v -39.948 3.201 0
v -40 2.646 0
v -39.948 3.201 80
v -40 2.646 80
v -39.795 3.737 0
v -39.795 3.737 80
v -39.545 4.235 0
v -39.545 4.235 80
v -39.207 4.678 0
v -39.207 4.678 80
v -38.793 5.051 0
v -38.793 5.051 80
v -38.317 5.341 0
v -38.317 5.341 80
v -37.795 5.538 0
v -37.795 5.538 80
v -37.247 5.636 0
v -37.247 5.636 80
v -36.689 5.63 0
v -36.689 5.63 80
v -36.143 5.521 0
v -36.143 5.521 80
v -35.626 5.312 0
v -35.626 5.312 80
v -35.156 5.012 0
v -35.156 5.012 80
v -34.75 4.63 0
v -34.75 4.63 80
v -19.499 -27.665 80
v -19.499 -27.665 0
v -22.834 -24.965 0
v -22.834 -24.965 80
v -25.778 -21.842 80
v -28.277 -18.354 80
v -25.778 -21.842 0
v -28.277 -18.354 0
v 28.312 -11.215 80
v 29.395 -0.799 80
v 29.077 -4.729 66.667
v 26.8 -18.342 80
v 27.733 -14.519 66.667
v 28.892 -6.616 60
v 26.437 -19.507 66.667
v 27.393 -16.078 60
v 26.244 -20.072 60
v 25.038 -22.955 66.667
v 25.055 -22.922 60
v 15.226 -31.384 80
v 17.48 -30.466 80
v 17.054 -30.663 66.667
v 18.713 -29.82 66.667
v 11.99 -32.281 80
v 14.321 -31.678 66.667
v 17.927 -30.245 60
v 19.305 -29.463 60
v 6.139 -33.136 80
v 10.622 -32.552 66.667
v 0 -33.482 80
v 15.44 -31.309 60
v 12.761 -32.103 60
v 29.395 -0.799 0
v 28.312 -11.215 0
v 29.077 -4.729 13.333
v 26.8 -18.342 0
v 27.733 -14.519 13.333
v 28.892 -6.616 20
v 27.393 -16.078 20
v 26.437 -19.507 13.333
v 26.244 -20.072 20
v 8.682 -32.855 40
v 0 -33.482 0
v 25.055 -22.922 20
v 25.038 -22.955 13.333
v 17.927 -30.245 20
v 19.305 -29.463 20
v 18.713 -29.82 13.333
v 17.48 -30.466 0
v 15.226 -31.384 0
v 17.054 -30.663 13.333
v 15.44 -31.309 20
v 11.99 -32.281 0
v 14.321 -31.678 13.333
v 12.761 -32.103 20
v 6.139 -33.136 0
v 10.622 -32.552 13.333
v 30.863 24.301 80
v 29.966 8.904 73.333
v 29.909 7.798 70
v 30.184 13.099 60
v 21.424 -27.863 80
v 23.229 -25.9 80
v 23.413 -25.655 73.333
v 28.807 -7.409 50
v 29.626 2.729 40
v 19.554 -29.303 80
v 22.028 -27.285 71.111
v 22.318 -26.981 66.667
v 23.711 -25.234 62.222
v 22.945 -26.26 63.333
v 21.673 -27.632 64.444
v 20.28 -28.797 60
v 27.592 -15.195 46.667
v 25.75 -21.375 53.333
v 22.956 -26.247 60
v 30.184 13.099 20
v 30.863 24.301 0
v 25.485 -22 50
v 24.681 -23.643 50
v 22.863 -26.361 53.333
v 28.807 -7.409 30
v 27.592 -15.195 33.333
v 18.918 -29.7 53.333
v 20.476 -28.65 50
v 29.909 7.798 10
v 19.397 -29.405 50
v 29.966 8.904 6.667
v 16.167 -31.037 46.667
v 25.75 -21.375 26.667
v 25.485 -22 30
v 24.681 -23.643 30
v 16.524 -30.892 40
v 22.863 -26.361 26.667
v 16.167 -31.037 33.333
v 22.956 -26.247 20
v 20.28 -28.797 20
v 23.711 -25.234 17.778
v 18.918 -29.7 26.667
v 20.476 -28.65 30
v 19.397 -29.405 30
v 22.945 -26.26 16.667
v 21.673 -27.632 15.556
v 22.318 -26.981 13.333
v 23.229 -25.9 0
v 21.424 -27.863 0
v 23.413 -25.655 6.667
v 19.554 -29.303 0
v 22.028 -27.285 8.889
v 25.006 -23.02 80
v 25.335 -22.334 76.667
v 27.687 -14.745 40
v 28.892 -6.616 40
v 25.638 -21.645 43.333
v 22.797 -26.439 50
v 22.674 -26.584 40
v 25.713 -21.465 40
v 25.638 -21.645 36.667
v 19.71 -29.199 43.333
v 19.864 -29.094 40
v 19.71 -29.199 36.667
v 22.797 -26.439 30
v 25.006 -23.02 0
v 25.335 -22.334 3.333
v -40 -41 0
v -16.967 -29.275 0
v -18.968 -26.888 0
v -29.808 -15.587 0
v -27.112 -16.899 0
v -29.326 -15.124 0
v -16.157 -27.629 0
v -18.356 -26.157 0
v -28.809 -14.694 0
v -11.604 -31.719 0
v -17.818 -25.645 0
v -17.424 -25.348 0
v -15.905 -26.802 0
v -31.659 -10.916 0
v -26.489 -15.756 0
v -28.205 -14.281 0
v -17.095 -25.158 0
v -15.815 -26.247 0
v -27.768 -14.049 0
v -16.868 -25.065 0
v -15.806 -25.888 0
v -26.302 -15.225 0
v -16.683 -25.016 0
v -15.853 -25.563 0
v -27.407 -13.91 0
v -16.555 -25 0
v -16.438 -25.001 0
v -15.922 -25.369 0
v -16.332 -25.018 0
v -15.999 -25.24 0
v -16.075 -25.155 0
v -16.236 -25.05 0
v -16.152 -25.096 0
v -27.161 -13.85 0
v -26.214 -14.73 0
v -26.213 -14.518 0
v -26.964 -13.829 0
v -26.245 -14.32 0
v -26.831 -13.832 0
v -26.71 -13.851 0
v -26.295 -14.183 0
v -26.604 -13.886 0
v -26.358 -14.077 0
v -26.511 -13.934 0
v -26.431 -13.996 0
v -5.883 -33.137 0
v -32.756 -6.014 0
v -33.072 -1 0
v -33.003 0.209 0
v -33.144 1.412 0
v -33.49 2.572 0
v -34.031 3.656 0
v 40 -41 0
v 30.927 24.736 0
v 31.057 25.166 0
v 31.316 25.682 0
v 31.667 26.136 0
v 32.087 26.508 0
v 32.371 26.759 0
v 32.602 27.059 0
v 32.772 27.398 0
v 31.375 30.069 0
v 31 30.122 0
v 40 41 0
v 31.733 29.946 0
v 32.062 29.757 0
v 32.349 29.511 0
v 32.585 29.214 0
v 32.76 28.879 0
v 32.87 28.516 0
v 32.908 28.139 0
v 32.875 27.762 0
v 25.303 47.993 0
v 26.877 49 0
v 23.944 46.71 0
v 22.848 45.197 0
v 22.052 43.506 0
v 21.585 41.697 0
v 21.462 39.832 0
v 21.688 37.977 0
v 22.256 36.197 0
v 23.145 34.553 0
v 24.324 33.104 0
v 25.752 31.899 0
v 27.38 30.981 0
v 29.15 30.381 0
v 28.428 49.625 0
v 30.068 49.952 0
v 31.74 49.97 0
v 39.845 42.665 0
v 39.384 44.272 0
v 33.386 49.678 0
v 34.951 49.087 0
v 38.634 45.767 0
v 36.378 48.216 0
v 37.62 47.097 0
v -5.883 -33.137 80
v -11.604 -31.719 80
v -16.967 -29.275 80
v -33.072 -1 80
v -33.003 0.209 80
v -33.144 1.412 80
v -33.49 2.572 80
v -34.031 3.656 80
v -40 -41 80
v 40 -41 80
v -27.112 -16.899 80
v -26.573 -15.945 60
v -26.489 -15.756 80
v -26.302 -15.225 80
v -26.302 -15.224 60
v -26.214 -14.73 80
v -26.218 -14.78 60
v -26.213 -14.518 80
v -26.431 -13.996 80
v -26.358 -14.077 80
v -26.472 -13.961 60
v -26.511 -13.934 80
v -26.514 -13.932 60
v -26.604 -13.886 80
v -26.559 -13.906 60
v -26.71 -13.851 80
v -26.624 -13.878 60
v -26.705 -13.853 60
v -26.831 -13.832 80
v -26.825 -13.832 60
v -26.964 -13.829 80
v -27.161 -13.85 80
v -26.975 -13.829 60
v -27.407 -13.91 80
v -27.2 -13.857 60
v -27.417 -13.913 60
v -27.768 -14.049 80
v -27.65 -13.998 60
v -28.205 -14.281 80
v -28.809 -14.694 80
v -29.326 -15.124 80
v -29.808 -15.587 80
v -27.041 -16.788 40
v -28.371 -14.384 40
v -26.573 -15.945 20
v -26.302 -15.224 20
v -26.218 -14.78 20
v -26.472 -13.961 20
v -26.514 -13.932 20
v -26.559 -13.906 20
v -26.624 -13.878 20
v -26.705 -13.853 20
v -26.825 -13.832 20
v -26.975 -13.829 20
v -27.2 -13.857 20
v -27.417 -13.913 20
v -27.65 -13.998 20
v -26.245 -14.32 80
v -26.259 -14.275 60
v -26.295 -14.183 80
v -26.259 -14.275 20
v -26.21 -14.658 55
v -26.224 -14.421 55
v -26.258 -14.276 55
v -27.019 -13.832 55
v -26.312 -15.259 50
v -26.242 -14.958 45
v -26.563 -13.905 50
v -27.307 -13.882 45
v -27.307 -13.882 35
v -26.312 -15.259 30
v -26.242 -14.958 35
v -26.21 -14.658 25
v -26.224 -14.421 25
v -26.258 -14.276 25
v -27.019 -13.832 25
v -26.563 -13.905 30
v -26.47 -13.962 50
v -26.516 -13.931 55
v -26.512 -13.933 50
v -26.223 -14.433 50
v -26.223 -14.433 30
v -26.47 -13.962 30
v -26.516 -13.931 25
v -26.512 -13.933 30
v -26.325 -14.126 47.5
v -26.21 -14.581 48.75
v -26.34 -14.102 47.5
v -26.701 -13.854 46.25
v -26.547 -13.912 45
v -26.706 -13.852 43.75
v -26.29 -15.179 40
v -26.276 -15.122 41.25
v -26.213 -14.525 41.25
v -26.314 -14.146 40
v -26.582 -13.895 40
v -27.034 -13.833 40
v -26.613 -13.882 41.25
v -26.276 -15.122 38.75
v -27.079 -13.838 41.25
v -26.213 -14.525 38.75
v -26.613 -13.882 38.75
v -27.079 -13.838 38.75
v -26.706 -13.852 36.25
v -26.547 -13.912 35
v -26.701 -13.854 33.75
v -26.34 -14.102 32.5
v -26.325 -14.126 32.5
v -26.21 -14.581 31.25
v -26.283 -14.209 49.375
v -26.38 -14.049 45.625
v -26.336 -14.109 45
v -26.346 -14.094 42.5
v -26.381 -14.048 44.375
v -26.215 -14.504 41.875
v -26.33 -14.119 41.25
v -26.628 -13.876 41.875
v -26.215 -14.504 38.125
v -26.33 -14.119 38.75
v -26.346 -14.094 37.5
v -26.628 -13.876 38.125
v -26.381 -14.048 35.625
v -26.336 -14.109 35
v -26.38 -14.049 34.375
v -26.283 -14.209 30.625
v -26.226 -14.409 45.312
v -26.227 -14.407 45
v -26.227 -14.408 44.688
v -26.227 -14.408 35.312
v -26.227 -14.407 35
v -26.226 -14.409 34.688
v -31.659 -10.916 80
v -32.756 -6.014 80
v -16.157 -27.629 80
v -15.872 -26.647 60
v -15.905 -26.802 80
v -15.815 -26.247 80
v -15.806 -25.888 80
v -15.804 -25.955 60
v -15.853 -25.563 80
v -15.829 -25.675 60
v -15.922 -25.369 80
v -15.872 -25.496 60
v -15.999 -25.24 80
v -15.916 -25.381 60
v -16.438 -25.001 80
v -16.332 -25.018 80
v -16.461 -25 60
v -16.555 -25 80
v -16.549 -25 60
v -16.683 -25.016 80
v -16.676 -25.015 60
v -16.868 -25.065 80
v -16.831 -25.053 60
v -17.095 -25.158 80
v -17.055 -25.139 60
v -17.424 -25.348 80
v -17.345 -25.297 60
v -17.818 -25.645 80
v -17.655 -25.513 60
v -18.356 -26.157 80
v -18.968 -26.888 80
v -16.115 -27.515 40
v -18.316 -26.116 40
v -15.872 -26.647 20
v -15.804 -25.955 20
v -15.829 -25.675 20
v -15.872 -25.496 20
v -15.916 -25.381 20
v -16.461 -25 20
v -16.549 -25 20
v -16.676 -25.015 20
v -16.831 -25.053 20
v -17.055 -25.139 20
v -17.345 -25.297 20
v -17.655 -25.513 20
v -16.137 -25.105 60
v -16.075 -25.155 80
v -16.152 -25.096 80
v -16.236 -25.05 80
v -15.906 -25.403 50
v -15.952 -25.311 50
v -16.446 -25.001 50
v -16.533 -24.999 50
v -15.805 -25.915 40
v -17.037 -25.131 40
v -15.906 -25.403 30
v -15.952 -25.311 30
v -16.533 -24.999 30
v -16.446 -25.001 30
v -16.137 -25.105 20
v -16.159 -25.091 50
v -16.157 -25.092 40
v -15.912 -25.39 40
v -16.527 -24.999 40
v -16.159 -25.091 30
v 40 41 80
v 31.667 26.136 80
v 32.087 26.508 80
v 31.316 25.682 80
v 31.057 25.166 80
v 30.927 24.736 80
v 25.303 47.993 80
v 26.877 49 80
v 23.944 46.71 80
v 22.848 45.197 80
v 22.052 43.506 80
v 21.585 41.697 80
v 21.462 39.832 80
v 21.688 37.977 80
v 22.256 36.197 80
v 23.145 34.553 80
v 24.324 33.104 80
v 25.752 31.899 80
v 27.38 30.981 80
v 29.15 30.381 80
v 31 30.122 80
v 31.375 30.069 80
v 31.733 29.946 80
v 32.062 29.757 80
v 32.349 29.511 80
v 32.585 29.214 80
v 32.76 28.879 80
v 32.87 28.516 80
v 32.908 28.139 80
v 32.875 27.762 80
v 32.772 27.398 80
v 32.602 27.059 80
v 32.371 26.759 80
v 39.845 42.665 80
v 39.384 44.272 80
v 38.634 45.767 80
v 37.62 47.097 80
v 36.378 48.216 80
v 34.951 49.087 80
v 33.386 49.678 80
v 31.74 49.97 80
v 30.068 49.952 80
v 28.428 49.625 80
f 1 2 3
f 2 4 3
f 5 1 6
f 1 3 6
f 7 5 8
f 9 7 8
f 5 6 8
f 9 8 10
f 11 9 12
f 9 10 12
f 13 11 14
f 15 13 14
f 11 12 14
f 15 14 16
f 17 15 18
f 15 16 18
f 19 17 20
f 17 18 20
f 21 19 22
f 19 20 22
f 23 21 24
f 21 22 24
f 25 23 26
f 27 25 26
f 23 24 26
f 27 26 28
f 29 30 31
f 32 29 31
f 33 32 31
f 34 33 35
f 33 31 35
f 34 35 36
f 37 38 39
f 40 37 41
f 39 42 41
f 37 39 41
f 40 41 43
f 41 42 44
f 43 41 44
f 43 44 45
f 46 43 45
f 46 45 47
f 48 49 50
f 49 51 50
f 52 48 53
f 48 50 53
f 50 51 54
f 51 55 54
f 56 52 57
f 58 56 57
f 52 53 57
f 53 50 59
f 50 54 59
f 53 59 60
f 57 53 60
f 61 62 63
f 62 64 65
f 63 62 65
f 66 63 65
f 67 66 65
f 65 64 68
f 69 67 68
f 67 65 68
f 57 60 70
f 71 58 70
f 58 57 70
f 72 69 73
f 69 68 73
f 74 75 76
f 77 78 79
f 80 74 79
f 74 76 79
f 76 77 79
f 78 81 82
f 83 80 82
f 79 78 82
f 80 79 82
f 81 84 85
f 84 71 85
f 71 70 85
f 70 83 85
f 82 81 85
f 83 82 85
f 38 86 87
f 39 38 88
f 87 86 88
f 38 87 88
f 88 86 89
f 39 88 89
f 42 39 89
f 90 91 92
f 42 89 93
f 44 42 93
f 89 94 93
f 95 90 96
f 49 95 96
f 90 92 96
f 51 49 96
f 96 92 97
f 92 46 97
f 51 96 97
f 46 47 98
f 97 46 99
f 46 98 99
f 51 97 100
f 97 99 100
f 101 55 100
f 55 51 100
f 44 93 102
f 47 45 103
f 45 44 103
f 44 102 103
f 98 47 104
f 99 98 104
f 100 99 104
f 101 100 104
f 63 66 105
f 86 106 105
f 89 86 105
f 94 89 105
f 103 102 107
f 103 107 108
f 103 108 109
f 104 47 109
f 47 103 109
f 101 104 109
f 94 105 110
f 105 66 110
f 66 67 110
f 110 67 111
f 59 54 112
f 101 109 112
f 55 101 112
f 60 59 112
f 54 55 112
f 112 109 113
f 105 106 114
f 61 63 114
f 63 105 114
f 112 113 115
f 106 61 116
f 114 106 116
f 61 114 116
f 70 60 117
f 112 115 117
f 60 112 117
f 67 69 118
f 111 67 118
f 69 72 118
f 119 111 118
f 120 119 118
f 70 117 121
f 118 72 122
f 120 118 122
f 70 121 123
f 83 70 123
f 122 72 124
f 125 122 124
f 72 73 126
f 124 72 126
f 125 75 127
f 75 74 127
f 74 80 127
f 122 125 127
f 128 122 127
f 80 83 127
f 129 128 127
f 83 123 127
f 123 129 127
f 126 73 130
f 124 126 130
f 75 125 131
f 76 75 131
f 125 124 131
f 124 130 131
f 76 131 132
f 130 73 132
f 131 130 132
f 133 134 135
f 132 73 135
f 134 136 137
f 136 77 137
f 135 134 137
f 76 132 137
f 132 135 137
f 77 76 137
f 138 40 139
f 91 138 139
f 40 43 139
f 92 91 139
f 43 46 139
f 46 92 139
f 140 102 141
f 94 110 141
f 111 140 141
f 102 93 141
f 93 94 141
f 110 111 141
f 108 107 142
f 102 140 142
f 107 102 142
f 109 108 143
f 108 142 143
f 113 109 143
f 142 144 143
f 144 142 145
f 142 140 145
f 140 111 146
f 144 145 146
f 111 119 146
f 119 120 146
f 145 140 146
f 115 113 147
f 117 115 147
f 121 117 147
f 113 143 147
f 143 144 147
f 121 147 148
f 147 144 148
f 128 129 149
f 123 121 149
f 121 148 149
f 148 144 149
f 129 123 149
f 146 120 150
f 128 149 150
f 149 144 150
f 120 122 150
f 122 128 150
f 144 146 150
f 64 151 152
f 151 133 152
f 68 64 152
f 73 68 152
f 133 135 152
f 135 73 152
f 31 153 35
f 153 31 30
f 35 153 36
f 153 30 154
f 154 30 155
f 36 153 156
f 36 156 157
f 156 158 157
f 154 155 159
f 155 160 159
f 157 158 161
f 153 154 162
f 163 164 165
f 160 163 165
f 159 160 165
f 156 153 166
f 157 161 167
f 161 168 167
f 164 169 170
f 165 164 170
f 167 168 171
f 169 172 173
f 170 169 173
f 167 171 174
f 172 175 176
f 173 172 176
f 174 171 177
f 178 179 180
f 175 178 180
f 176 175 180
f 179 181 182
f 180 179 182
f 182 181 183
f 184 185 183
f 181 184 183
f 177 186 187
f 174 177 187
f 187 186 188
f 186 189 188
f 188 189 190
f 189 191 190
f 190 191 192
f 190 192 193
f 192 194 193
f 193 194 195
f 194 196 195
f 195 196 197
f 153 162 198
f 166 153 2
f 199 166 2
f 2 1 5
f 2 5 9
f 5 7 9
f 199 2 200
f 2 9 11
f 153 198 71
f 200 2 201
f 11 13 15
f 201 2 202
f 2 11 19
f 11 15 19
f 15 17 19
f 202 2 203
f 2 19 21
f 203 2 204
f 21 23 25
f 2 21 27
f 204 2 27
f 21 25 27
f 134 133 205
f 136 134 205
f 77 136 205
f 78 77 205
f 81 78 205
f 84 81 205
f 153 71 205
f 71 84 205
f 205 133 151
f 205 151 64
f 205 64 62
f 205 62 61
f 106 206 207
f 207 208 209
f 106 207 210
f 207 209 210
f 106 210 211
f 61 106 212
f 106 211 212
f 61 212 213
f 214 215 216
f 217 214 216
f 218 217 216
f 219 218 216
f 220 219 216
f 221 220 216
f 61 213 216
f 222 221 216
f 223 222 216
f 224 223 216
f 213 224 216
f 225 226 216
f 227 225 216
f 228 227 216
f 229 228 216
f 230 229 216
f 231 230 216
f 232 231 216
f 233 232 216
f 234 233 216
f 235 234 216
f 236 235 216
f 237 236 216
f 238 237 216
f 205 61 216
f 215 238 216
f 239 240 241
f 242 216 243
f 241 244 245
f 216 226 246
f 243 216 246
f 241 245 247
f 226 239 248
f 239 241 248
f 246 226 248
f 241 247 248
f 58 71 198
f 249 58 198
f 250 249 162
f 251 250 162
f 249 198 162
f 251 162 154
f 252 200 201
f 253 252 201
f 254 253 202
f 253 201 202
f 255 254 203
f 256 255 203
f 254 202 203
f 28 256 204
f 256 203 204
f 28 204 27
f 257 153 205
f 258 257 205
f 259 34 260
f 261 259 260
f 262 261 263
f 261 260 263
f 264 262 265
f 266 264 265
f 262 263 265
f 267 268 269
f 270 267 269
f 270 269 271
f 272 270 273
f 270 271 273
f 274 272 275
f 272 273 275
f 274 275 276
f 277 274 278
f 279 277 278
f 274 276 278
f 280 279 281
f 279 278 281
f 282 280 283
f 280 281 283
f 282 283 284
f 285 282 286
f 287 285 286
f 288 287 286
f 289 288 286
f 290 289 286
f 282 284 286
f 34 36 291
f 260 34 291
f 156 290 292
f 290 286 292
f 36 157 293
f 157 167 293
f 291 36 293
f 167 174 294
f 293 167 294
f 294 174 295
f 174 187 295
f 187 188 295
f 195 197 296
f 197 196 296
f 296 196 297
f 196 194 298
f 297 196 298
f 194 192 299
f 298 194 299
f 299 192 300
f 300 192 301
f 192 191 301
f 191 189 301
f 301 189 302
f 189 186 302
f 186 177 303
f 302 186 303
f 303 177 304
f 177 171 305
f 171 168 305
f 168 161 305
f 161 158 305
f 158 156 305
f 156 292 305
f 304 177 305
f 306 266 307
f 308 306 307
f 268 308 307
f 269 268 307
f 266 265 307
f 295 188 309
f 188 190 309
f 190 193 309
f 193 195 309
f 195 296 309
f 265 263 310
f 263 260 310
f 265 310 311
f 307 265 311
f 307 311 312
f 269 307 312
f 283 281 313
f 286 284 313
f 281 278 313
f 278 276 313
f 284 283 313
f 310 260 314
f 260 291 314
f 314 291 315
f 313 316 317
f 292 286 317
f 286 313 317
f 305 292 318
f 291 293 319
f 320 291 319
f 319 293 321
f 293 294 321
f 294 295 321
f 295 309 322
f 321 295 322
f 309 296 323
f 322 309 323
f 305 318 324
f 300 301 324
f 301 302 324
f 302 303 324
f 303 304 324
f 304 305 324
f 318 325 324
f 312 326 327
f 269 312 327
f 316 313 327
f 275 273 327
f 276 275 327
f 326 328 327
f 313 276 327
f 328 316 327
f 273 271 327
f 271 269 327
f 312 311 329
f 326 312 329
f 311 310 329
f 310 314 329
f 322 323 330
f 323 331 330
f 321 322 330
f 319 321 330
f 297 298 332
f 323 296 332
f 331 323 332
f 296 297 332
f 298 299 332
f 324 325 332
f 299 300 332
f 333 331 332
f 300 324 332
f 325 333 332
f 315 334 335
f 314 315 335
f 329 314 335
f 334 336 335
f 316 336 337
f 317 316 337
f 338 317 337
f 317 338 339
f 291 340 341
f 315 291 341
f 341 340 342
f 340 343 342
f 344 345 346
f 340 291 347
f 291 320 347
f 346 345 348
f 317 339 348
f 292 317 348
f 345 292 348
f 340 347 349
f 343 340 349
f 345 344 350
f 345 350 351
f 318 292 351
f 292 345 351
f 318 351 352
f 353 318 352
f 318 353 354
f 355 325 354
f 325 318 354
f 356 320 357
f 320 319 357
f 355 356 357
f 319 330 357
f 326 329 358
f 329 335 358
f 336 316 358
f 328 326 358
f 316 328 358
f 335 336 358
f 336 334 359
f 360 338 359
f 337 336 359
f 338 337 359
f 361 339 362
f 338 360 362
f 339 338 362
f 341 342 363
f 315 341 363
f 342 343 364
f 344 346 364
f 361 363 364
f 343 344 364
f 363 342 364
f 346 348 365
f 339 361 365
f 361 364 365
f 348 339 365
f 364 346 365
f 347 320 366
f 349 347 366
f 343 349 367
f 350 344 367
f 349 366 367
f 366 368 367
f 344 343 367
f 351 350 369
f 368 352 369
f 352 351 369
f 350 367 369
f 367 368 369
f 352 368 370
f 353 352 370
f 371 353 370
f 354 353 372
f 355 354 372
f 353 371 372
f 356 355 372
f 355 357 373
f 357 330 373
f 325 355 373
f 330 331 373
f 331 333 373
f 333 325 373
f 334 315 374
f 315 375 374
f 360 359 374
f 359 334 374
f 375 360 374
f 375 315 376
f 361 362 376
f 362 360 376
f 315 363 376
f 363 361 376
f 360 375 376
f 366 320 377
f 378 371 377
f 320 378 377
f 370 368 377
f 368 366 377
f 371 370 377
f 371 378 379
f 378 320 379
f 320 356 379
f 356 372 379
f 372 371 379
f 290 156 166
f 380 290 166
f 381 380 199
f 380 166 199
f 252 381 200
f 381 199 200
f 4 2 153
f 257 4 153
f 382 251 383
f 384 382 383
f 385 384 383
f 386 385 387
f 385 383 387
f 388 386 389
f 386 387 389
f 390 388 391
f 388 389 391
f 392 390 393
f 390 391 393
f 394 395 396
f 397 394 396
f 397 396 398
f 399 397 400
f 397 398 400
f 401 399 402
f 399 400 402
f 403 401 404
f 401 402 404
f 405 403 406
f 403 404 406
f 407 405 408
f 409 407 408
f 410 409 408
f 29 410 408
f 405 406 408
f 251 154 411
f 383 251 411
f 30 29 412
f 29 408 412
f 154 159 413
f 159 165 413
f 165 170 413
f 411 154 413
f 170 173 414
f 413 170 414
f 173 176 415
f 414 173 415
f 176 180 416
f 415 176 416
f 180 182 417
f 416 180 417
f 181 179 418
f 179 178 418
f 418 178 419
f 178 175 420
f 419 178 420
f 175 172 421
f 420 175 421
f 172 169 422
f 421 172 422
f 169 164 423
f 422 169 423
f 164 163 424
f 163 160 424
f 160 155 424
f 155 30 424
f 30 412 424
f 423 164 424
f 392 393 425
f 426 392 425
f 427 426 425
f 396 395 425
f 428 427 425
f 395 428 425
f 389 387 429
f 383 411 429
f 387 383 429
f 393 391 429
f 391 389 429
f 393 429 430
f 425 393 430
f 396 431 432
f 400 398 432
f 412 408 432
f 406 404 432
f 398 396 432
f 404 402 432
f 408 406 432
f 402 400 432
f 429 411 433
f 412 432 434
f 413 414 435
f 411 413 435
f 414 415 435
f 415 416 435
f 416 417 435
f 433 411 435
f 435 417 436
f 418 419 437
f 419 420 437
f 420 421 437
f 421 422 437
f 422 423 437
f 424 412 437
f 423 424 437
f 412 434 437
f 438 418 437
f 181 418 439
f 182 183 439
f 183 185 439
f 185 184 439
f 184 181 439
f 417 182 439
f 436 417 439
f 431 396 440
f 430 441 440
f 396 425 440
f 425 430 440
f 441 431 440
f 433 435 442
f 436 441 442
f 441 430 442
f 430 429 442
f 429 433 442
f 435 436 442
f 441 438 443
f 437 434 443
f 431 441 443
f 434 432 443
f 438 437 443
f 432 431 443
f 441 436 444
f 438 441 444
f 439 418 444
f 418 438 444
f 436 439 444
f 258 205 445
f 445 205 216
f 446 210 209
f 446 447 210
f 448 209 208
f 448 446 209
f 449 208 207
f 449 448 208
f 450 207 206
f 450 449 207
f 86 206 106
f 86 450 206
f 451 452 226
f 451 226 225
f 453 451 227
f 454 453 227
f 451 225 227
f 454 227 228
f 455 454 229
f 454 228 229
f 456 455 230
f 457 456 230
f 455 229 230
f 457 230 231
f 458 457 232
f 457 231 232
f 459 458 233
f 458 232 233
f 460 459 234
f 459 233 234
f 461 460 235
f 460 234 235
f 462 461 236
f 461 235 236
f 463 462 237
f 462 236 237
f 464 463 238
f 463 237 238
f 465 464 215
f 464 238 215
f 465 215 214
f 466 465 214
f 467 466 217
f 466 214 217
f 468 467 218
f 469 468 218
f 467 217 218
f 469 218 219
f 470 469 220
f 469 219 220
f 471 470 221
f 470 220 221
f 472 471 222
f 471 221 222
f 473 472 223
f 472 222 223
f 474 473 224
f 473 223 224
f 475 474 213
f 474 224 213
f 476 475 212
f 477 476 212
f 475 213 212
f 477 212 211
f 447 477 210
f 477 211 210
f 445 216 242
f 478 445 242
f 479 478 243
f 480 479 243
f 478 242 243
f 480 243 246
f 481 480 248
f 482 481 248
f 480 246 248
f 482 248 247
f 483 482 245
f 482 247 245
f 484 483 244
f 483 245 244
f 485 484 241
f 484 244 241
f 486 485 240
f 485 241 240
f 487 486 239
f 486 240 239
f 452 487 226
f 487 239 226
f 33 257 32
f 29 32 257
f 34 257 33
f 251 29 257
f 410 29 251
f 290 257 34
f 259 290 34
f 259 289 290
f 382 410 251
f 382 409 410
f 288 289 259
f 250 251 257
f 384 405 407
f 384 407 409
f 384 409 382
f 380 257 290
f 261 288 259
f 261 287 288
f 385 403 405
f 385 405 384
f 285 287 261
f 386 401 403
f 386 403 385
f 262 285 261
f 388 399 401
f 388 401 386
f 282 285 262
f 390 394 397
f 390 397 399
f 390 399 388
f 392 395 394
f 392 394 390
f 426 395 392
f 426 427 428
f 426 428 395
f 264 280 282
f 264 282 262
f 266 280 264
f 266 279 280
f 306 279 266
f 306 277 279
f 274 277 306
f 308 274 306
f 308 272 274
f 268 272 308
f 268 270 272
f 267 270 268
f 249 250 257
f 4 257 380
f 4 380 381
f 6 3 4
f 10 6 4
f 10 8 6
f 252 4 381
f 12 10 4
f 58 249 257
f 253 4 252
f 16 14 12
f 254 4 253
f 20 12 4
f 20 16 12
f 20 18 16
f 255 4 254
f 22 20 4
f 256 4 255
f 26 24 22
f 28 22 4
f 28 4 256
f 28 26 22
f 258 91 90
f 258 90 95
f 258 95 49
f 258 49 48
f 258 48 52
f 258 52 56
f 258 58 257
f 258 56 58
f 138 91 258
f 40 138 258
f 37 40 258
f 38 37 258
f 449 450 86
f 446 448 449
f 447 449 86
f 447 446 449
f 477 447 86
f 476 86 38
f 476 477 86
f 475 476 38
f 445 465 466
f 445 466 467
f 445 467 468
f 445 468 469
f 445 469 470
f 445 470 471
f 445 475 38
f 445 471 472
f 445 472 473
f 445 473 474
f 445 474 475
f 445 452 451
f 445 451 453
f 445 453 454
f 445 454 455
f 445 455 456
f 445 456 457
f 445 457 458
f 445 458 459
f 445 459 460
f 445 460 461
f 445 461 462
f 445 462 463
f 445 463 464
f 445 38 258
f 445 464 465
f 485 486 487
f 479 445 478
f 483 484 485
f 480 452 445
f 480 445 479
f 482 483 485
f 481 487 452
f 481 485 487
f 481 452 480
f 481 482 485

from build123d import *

# Parameters (mm, degrees)
F1_DEPTH = 80
F2_R     = 3
F3_R     = 3


with BuildPart() as f1:
    # F0 (on Top) → F1 (new body)
    with BuildSketch(Plane.XY):
        with BuildLine():
            Line((-40, 7), (-40, -41))
            Line((-40, -41), (40, -41))
            Line((40, -41), (40, 41))
            ThreePointArc((40, 41), (35.6846584384, 48.6846584384), (26.8768943744, 49))
            ThreePointArc((26.8768943744, 49), (21.6884164325, 37.9773734121), (31, 30.1216104501))
            ThreePointArc((31, 30.1216104501), (32.9083754305, 28.1237103179), (31, 26.1258101857))
            add(Edge.make_bspline(
                [(31, 26.1258101857), (29.1383194506, 2.2108836058), (30.9167526541, -31.2253562681), (8.8170867264, -33.1853542307), (0, -33.4819146159)],
                knots=[0, 0, 0, 0, 0.6000833432, 1, 1, 1, 1], degree=3))
            ThreePointArc((0, -33.4819146159), (-8.7763698001, -32.5596158188), (-16.9671031431, -29.2752301466))
            add(Edge.make_bspline(
                [(-16.9671031431, -29.2752301466), (-14.901822055, -25.8906310448), (-16.1565216247, -25.0924466589), (-17.4112211944, -24.2942622731), (-19.4985771018, -27.664818351)],
                knots=[4.7144665779, 4.7144665779, 4.7144665779, 6.2764659366, 6.2764659366, 7.8384652954, 7.8384652954, 7.8384652954], degree=2, weights=[1, 0.710210129, 1, 0.710210129, 1]))
            ThreePointArc((-19.4985771018, -27.664818351), (-24.3581566231, -23.452844128), (-28.2774287922, -18.3542614188))
            add(Edge.make_bspline(
                [(-28.2774287922, -18.3542614188), (-25.5565793832, -15.5150943204), (-26.3141793997, -14.1455346477), (-27.0717794162, -12.7759749751), (-29.8082391869, -15.5869222722)],
                knots=[1.4456697136, 1.4456697136, 1.4456697136, 3.0061633493, 3.0061633493, 4.566656985, 4.566656985, 4.566656985], degree=2, weights=[1, 0.7107399344, 1, 0.7107399344, 1]))
            ThreePointArc((-29.8082391869, -15.5869222722), (-32.3036744342, -8.4866885025), (-33.0717967697, -1))
            ThreePointArc((-33.0717967697, -1), (-34.7084973779, 4.582575695), (-40, 7))
        make_face()
    extrude(amount=F1_DEPTH)

    # F2
    f2_edges = [f1.edges().sort_by_distance(p)[0] for p in [
        (-40, 7, 40),
    ]]
    fillet(f2_edges, radius=F2_R)

    # F3
    f3_edges = [f1.edges().sort_by_distance(p)[0] for p in [
        (31, 26.12581, 40),
    ]]
    fillet(f3_edges, radius=F3_R)


solid = f1.part
